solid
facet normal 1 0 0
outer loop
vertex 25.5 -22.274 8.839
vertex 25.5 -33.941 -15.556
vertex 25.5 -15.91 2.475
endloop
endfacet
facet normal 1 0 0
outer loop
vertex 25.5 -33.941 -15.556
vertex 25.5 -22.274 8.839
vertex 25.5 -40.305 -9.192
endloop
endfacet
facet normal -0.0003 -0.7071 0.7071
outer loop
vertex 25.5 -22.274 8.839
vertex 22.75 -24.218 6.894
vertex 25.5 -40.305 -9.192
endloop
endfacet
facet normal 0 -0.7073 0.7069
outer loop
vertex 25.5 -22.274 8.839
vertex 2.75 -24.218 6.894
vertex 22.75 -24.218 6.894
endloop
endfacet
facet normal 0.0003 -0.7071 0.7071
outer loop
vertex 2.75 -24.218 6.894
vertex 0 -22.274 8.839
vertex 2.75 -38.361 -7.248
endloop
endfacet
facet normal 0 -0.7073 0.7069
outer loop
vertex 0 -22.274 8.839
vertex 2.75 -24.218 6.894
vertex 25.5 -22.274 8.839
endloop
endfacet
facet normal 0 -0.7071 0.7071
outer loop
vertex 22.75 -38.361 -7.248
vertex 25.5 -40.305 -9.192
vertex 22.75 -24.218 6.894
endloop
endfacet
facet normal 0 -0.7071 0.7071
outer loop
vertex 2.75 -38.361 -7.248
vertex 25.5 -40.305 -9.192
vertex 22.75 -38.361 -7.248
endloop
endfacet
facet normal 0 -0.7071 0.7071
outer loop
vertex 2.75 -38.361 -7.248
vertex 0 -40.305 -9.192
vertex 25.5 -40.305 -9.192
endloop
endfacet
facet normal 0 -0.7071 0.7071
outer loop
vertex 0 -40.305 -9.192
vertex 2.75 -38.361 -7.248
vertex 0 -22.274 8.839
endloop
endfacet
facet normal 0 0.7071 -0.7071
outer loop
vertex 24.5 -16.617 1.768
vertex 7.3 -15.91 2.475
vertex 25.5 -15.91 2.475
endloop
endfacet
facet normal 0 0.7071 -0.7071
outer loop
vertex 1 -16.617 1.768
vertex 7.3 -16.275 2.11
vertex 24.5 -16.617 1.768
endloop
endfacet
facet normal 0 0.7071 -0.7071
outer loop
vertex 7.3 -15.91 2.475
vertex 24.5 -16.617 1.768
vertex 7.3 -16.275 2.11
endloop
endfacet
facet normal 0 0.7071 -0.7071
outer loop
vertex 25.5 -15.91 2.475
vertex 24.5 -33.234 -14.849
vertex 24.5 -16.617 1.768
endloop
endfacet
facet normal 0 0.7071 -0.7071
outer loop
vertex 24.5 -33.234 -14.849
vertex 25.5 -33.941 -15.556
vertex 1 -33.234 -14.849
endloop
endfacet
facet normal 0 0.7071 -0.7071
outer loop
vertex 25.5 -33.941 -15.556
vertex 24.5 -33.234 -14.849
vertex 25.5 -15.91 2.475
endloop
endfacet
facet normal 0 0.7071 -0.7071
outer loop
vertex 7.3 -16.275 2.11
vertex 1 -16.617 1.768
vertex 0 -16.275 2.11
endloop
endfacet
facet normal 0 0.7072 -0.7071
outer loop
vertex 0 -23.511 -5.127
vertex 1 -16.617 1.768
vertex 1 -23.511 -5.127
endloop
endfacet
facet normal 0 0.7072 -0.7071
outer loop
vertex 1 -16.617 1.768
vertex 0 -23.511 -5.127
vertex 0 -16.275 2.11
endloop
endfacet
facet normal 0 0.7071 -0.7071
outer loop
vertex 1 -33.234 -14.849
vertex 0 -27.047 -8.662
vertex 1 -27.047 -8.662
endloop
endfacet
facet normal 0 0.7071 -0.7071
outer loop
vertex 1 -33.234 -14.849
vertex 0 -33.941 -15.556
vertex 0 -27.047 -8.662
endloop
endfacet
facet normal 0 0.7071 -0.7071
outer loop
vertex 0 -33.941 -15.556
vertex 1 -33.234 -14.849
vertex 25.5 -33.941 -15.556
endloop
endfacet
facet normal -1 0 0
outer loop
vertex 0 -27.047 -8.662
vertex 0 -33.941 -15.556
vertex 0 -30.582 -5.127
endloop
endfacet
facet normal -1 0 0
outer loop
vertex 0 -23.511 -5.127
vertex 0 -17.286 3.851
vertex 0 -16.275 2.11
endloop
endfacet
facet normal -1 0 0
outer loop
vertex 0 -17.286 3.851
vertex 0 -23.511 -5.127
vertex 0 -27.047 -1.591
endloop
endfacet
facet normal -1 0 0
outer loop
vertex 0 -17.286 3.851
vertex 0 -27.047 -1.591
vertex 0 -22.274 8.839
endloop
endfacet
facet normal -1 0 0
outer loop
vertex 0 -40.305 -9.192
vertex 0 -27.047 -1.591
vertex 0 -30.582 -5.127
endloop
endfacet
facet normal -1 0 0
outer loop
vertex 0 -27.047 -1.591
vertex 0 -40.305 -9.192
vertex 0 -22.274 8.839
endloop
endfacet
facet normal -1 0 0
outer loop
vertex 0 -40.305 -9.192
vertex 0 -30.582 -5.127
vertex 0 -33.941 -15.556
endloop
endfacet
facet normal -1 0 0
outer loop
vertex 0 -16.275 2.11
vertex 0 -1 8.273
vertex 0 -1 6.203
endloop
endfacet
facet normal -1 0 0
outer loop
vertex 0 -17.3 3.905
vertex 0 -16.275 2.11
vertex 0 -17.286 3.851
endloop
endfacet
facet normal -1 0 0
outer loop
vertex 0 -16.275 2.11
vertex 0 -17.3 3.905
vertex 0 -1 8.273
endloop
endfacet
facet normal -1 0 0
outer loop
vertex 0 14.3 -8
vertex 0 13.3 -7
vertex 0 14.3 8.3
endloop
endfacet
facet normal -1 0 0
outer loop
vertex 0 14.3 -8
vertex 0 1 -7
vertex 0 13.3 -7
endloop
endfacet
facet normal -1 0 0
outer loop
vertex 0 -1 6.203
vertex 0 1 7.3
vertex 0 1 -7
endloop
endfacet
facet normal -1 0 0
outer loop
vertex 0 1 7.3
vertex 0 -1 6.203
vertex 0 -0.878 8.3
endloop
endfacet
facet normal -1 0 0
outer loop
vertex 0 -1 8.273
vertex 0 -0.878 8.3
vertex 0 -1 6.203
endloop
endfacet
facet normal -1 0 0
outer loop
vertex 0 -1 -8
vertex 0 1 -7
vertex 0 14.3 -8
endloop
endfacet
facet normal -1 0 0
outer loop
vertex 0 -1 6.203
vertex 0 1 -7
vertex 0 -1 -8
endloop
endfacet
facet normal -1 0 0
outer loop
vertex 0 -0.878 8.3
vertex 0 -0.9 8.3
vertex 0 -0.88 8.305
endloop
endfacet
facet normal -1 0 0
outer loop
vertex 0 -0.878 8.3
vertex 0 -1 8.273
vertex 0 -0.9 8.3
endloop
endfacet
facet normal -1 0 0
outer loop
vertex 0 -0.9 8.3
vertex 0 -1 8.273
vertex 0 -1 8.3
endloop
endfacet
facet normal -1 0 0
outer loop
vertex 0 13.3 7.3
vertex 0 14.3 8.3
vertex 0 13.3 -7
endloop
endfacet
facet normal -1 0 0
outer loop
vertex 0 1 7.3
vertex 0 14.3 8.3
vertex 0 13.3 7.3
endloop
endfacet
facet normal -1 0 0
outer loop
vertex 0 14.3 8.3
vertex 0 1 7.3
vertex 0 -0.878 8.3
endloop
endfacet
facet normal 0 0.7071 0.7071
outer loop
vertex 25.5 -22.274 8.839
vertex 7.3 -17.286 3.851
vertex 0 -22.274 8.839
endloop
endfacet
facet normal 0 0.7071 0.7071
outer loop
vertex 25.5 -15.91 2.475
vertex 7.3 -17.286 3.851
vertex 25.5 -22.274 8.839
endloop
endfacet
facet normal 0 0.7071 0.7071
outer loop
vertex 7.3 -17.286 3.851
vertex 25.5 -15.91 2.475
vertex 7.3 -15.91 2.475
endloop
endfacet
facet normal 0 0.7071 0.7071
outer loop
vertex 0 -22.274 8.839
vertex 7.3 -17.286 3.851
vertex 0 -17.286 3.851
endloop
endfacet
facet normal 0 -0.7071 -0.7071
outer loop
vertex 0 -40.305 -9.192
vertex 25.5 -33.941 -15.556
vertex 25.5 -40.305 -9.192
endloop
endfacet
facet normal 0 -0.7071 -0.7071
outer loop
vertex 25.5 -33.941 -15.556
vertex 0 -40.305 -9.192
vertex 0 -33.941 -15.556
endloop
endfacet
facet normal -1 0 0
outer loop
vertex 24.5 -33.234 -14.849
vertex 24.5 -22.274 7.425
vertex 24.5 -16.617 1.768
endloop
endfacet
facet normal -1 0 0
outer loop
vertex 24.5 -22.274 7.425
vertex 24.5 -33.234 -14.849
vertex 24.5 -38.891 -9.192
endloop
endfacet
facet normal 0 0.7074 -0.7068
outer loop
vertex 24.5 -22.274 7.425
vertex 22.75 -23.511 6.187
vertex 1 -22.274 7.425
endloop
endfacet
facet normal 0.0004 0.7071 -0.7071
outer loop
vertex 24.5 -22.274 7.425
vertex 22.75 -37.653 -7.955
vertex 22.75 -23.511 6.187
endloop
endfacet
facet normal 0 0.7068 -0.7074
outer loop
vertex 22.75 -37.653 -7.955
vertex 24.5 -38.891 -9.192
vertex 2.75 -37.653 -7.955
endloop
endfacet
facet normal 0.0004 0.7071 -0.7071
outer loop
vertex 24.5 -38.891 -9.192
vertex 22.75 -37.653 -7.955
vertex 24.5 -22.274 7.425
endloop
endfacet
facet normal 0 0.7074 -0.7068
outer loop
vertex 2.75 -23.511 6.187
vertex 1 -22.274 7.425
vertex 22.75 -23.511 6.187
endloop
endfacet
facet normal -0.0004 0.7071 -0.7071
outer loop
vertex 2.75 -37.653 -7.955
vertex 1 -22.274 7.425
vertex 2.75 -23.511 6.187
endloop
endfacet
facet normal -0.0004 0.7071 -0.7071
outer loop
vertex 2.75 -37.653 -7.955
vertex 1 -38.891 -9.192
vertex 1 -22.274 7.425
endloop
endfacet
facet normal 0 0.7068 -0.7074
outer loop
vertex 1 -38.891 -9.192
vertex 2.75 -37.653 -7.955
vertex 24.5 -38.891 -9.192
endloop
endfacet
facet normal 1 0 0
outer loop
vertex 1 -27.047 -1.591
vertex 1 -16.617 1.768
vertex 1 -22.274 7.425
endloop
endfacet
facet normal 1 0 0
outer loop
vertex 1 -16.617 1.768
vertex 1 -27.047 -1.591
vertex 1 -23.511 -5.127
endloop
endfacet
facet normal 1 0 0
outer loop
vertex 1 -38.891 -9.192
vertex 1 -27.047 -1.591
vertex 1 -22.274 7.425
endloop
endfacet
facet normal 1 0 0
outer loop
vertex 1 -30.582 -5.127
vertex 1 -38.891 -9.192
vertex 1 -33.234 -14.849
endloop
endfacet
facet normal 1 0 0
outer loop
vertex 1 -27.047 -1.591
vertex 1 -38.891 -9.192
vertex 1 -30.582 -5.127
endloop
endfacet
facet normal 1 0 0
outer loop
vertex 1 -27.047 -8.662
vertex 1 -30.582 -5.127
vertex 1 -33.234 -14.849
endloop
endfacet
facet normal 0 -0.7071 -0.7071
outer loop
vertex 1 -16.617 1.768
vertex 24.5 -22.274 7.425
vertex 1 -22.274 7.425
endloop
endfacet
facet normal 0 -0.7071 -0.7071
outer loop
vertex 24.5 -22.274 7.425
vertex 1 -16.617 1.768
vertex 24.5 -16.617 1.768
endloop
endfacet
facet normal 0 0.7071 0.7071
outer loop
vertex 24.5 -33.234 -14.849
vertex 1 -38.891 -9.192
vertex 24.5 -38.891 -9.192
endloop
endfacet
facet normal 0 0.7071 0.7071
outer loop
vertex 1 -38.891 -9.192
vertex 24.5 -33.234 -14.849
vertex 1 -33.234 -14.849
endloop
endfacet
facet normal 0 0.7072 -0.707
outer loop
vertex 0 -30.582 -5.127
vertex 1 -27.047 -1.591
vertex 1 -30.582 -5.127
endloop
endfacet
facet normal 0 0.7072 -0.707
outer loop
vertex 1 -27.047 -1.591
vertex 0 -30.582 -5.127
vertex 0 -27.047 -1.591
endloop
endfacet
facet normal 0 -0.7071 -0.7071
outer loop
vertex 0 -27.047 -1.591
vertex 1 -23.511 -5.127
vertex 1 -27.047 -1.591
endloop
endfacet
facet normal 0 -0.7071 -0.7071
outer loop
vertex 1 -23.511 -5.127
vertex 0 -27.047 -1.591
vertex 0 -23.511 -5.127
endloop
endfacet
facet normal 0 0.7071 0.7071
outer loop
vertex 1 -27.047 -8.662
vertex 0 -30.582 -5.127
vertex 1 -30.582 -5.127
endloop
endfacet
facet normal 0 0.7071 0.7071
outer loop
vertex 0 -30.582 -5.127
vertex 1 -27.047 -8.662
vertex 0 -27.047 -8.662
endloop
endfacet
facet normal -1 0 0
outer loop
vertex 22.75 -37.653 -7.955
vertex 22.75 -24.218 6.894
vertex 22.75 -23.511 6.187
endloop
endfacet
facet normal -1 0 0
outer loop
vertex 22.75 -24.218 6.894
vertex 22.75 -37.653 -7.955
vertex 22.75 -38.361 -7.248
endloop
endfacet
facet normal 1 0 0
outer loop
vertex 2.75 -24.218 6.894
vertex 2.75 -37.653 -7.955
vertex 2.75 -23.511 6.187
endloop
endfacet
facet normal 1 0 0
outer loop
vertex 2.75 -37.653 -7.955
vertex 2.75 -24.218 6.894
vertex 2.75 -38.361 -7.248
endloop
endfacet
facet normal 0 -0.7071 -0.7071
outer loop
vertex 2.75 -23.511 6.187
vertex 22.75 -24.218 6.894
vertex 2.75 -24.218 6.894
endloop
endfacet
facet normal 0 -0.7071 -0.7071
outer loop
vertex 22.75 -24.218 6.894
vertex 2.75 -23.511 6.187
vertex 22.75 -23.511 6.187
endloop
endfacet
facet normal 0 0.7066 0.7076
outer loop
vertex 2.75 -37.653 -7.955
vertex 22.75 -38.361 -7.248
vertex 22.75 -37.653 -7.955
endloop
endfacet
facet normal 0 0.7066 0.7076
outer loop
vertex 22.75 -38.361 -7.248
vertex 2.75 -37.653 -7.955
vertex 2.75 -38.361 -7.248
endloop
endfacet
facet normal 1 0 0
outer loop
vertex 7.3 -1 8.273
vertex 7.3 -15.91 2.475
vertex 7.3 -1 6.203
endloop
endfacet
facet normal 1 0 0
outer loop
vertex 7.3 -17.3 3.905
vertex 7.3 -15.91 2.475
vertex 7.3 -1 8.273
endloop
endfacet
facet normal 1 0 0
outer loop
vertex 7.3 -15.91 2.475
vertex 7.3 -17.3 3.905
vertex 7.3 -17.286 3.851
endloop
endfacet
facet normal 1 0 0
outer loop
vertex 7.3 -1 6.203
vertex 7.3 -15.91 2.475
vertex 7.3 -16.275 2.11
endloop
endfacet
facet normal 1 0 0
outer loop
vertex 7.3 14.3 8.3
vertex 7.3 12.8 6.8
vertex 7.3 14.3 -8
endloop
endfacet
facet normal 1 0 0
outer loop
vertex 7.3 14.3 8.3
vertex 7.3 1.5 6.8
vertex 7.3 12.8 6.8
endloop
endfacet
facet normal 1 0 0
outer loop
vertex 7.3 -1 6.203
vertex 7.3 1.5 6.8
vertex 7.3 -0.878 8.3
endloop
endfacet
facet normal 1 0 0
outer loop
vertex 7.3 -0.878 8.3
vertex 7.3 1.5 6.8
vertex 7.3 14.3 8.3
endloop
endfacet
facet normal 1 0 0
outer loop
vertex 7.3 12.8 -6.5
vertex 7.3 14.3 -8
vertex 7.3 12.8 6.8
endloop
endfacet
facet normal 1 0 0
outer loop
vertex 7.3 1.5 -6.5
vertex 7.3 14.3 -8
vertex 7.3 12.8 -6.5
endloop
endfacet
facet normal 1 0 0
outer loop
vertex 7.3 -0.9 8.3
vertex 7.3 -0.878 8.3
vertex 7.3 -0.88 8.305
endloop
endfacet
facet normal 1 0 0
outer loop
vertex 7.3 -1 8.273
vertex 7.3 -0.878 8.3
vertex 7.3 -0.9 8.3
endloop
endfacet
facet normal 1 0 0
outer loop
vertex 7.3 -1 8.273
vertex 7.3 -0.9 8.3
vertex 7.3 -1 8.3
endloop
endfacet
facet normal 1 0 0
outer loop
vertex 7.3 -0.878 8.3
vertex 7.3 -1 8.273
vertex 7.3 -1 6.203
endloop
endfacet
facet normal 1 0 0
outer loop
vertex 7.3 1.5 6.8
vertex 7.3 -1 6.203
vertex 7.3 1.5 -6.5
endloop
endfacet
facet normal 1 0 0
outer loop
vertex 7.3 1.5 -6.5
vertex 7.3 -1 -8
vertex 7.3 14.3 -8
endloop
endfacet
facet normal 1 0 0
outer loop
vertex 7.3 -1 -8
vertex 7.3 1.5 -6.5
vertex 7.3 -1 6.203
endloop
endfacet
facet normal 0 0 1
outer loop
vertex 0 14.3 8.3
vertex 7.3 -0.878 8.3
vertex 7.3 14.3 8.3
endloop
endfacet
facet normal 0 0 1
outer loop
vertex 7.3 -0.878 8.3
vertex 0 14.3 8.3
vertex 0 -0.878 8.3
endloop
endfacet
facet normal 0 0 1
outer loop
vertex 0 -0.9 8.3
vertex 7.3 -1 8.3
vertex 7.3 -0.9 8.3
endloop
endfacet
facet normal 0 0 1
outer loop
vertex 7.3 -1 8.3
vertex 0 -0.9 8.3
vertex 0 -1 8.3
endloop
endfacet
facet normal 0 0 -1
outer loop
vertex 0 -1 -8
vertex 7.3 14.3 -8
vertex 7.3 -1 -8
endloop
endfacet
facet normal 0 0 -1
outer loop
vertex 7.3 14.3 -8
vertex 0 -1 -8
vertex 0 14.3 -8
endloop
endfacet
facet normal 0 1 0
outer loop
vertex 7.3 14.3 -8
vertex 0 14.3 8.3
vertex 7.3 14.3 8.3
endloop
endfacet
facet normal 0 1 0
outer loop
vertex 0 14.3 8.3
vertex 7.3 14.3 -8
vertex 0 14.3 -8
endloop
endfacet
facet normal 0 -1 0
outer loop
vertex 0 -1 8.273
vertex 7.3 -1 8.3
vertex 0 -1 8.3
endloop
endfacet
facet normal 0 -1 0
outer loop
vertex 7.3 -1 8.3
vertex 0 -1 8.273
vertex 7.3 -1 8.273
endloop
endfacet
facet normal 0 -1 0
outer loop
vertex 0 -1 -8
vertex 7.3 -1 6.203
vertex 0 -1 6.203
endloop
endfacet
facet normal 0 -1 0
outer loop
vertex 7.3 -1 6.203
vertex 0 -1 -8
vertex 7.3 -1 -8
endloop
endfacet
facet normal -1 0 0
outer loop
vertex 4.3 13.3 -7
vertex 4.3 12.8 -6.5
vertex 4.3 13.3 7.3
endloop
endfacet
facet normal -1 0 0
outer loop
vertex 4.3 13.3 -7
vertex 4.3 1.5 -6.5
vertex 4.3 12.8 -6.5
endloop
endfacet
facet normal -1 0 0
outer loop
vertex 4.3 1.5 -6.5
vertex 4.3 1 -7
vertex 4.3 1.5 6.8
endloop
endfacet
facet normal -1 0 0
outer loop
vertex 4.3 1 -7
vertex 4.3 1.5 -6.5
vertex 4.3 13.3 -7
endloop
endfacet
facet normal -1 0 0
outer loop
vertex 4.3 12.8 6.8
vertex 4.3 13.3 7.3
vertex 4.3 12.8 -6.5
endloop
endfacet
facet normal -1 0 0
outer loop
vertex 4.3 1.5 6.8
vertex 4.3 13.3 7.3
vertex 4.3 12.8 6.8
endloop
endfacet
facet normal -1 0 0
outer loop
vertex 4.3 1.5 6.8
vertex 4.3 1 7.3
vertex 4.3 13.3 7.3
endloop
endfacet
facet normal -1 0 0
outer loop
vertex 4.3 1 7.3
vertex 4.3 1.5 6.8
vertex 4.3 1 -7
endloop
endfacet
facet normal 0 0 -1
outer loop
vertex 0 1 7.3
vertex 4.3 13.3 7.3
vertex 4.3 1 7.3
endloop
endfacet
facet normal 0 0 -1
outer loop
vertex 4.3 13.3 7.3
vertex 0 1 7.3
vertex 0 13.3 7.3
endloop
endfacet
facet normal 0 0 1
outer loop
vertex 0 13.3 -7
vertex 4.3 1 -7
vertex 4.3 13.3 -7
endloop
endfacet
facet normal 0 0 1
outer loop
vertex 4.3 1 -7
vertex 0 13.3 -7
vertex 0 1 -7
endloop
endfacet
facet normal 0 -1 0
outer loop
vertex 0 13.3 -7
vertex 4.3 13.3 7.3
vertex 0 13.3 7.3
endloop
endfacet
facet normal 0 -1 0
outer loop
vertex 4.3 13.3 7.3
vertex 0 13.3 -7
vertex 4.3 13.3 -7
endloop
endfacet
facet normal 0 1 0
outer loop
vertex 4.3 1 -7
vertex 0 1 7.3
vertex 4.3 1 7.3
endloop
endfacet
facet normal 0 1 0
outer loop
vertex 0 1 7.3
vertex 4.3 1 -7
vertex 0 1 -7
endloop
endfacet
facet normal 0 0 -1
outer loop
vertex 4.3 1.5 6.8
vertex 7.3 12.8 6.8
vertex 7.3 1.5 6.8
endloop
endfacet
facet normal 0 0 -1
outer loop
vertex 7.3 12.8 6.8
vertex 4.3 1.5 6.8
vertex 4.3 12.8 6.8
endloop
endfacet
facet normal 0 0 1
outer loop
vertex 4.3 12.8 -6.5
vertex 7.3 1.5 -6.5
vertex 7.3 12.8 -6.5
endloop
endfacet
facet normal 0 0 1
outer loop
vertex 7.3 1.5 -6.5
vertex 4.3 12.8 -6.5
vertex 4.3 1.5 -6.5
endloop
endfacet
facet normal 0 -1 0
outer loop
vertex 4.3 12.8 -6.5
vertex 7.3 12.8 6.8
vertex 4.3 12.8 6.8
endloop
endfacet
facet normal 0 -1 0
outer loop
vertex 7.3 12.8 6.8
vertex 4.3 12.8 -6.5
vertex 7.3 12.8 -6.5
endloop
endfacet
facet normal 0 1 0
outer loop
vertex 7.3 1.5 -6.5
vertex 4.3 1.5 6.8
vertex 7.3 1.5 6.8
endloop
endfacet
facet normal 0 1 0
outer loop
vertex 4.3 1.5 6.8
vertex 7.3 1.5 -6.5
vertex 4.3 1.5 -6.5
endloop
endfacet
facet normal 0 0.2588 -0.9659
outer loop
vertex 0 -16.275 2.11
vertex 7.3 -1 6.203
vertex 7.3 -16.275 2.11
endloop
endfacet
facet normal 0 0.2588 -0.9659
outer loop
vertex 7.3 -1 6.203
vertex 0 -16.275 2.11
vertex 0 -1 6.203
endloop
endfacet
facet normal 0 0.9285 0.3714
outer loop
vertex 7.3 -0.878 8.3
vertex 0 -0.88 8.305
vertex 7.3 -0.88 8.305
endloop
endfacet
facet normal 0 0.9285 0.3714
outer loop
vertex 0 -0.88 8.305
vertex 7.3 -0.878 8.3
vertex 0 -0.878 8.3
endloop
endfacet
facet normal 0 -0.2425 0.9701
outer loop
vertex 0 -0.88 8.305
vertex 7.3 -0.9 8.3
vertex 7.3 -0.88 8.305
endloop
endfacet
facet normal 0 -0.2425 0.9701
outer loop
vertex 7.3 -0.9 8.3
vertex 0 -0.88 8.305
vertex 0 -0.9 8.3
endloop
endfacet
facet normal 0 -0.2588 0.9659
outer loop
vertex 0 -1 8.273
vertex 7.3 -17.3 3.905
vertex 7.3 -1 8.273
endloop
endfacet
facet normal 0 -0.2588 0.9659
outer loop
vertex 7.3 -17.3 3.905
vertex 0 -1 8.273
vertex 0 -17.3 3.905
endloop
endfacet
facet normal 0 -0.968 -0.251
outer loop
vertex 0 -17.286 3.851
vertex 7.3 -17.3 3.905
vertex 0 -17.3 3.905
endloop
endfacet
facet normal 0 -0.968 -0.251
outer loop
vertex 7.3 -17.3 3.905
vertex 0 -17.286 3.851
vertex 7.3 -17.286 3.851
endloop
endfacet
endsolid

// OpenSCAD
thickness = 2.5;
thicknessWC = 1;
length = 2.5;
lengthTop = 6.75;
gapWidth = 4.2;
pi = 3.141592653589793;
webcamSide = 23.5;
webcamSideCut = 20;
webcamHeight = 8;
barOffset = 15;
barLength = 60;
barDrop = 15;
wireHolderWidth = 2.75;
wireGapWidth = 5;
// Good w and w/o band
glassTouchpadHeight = 16.8;
glassTouchpadWidth = 7.55;


// Make webcam holder
rotate([45, 0, 0]) {
translate([0, -35, 13]) {
difference() {
cube([webcamSide + thicknessWC * 2, webcamSide + thicknessWC * 2, thicknessWC + webcamHeight]);
translate([thicknessWC, thicknessWC, -thicknessWC]) cube([webcamSide, webcamSide, webcamHeight + thicknessWC]);
translate([0, thicknessWC/2 + webcamSide / 2 - wireGapWidth / 2, -thicknessWC]) cube([webcamSide + thicknessWC, wireGapWidth, webcamHeight * 3 / 4]);
translate([thicknessWC + (webcamSide - webcamSideCut) / 2, thicknessWC + (webcamSide - webcamSideCut) / 2, webcamHeight]) cube([webcamSideCut, webcamSideCut, thicknessWC]);
}
}
}
rotate([15, 0, 0]) {
translate([0, -15.7, 6.25]) {
translate([0, 0, 0]) cube([prismWidth, 17, 2 * thickness ]);
}}



thickness = 1;
fudge = .3;
prismHeightGlass = 12 + fudge;
prismHeight = 12 + fudge;
prismWidth = 7 + fudge;
prismDepth = 14 + fudge;
prismDepthGlass = 14 + fudge;
mirrorSide = 25.7;
mirrorSideEdge = 4;
mirrorDepth = 2.5;
translate([0, 0, -8]) {
difference() {
translate([0, -thickness, 0]) cube([prismWidth, prismHeight + thickness * 3, prismDepth + thickness * 2]);
translate([0, thickness, thickness]) cube([prismWidth - thickness * 3, prismHeight, prismDepth]);
translate([0, thickness + thickness / 2, thickness + thickness / 2]) cube([prismWidth, prismHeight - thickness, prismDepth - thickness]);

}
}
